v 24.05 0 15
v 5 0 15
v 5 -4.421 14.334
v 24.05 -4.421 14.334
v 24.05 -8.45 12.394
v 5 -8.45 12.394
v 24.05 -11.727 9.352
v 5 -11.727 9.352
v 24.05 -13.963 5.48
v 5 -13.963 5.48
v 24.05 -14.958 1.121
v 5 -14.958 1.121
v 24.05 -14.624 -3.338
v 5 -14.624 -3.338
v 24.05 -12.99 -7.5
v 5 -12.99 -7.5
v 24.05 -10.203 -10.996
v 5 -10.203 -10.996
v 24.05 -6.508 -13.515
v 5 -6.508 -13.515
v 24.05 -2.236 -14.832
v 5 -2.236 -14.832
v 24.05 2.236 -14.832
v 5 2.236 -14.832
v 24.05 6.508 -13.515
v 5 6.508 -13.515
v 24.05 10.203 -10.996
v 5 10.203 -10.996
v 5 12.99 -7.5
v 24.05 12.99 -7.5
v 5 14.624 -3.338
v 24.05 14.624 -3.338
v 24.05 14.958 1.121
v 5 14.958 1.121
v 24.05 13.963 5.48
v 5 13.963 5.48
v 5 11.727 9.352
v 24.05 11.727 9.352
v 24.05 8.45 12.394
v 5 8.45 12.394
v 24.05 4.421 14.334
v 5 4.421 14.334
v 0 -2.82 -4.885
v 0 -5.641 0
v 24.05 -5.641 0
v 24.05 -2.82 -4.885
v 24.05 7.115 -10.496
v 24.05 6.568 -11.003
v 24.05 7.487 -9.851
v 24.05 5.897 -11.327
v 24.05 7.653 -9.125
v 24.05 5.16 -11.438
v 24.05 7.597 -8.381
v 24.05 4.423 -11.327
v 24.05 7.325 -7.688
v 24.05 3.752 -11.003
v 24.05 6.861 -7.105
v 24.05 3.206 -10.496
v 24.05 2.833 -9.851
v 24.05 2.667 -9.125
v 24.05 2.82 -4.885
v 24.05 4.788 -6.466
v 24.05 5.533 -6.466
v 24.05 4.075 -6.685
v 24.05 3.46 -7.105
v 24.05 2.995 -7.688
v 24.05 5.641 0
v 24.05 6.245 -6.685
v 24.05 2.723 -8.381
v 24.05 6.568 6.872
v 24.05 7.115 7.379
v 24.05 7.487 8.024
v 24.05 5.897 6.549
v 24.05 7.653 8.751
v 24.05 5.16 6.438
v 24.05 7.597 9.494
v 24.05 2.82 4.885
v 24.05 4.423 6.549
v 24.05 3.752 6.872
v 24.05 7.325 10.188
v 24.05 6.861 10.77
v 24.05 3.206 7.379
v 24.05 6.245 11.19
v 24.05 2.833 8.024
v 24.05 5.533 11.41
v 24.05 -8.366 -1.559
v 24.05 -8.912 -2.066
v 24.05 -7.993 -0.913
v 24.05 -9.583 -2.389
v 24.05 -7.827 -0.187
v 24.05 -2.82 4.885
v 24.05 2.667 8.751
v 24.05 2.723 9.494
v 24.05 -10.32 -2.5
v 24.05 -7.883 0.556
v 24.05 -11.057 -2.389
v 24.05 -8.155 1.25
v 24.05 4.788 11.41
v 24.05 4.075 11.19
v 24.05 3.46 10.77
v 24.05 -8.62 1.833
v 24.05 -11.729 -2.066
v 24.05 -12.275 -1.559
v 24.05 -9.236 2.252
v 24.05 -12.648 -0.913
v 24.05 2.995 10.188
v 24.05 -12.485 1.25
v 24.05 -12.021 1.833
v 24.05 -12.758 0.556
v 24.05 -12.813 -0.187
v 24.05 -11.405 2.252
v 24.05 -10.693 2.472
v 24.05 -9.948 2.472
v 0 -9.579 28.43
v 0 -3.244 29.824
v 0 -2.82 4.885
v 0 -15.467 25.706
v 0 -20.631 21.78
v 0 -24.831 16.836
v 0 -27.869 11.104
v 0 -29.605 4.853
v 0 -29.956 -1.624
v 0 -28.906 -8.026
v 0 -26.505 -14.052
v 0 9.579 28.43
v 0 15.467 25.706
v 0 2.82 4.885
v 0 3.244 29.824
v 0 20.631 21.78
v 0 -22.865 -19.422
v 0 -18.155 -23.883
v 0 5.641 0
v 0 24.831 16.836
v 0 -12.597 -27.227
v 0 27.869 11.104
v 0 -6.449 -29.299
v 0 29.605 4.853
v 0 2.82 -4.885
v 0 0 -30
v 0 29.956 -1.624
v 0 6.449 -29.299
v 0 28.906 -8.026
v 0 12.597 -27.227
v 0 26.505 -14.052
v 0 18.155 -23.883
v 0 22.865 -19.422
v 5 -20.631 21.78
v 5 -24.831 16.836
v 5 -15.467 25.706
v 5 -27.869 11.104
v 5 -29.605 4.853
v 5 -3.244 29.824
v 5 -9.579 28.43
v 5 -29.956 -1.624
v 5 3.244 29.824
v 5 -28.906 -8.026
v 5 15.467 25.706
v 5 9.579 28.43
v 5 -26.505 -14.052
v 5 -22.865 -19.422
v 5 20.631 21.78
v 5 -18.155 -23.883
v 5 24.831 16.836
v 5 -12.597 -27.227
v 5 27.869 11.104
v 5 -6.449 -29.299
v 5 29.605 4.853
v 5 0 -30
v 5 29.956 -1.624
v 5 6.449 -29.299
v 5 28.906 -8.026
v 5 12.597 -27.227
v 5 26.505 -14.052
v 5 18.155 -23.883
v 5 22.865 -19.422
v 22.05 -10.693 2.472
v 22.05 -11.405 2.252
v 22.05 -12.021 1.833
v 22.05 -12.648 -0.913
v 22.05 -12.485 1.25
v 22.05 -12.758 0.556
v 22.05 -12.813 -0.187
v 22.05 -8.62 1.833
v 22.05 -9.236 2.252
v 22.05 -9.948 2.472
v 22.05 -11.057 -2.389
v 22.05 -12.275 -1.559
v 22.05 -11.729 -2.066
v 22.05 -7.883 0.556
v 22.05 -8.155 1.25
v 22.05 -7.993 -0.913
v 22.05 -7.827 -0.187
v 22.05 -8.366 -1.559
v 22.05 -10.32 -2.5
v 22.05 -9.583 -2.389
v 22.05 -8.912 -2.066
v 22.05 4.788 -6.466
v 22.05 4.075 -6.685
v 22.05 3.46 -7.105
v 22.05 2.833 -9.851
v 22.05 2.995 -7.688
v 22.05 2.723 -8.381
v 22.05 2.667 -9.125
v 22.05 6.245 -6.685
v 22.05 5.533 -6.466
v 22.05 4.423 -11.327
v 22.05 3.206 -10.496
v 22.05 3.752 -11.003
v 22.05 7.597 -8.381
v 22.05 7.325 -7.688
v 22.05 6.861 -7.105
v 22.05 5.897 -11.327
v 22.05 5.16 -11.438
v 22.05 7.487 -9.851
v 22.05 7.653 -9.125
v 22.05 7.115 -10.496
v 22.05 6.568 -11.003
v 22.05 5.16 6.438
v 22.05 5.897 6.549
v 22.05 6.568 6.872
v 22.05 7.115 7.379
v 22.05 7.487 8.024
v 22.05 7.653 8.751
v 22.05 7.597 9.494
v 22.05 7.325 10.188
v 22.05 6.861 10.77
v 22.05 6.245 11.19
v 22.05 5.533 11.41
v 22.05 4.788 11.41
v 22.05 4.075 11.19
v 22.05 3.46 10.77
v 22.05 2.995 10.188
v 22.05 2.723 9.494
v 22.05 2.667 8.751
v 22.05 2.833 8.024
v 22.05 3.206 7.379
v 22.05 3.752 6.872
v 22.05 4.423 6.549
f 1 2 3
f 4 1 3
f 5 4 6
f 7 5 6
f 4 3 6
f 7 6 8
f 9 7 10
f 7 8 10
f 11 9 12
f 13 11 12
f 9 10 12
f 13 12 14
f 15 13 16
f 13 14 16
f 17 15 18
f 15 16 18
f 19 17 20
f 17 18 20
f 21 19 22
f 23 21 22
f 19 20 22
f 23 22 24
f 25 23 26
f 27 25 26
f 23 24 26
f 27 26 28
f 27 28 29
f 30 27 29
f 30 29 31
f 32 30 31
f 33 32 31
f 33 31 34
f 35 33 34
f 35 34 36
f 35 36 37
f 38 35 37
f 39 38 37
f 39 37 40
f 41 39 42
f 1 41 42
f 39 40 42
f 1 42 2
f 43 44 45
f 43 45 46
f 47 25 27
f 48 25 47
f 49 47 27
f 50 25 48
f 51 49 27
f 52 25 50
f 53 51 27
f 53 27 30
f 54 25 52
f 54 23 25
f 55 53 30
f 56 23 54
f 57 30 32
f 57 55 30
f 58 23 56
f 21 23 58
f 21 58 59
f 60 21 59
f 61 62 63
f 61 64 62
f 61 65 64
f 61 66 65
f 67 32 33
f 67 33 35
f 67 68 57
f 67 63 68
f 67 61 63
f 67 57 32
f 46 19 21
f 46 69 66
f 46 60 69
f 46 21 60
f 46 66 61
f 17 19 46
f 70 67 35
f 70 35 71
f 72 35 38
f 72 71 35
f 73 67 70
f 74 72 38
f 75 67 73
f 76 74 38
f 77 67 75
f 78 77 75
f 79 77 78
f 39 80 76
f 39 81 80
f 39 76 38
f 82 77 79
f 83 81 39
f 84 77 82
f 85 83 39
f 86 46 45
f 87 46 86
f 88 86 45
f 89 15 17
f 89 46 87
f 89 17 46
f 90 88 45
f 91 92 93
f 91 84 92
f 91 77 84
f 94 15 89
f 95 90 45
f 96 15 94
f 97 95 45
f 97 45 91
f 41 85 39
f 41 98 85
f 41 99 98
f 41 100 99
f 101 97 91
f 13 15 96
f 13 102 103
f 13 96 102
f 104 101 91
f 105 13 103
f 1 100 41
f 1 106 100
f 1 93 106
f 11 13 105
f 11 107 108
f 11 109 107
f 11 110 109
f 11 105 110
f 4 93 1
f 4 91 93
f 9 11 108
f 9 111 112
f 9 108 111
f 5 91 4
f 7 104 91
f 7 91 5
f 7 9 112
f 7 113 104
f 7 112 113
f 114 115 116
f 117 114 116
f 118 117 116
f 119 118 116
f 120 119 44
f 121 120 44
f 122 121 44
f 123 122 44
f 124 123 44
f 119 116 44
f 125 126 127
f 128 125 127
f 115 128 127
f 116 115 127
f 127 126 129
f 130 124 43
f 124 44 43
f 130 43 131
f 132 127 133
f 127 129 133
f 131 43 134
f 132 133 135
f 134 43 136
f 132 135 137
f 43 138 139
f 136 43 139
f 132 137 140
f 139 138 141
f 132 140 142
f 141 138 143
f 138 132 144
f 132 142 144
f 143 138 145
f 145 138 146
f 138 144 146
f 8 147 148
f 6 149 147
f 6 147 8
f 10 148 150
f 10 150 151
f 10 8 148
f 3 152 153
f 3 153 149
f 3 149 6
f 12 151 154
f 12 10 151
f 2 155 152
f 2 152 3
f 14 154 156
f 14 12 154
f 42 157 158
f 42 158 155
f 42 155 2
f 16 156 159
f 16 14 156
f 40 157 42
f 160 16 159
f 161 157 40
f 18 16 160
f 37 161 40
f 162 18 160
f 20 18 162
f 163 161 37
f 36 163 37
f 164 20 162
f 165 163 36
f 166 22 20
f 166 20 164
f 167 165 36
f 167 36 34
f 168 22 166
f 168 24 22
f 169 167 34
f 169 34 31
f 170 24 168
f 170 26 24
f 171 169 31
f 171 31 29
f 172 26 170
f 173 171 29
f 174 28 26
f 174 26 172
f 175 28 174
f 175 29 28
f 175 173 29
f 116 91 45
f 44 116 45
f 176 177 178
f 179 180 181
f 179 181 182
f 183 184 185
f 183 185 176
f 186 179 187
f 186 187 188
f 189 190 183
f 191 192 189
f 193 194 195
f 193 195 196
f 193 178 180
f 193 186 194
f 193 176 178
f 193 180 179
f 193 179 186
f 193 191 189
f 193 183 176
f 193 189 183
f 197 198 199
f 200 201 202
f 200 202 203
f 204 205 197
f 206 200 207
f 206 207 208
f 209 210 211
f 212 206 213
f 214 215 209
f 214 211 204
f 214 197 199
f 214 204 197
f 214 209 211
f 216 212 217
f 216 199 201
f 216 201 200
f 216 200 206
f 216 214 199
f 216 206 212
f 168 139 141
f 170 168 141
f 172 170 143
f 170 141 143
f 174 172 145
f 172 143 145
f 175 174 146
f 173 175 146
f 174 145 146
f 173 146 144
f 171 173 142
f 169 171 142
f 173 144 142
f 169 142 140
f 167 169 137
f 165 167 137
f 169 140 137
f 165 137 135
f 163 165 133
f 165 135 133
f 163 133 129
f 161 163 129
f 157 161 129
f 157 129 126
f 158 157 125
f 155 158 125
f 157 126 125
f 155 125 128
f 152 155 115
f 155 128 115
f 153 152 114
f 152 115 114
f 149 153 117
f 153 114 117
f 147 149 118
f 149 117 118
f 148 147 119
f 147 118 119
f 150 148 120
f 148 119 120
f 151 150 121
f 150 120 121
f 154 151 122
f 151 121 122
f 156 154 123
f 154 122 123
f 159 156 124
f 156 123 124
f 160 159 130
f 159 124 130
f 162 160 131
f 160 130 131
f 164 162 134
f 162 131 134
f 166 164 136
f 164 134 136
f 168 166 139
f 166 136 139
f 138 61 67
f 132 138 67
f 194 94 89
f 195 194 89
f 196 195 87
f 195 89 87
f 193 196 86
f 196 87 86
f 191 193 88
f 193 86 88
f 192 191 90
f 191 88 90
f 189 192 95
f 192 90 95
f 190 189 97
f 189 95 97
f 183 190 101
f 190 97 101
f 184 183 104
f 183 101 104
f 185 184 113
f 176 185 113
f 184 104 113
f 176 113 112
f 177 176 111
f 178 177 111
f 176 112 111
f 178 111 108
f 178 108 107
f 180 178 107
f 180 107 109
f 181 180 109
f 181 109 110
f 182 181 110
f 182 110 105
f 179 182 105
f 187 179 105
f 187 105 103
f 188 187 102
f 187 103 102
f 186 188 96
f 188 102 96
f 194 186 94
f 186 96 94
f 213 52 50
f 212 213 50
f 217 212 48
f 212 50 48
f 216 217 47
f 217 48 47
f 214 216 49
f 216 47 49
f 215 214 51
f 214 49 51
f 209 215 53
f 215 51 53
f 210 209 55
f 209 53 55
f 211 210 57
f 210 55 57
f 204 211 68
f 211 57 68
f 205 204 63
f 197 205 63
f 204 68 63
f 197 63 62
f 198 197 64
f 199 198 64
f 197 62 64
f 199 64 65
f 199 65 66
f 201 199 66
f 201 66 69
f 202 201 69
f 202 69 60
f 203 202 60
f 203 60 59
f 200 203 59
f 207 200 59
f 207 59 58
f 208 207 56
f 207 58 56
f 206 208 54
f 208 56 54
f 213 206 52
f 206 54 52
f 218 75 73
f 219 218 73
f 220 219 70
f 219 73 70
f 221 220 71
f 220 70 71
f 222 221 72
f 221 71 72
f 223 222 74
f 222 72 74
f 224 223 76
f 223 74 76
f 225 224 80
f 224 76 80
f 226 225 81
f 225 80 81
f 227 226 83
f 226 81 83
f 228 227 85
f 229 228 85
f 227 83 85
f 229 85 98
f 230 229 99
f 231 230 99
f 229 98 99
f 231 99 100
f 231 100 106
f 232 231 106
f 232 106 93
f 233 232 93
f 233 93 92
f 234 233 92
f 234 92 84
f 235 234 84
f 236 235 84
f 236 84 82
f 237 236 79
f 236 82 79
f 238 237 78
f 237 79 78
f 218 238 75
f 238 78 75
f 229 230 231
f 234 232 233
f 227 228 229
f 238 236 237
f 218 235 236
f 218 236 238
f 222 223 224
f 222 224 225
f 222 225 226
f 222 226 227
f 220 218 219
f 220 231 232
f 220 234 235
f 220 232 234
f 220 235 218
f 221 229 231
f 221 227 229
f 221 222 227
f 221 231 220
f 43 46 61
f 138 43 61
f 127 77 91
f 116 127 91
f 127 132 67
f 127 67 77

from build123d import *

# Parameters (mm, degrees)
SKETCH2_R           = 30
BOSS_EXTRUDE1_DEPTH = 5
SKETCH3_R           = 15
BOSS_EXTRUDE2_DEPTH = 19.05
CUT_EXTRUDE1_DEPTH  = 24.05
SKETCH5_R           = 2.5
CUT_EXTRUDE2_DEPTH  = 2


with BuildPart() as part:
    # Sketch2 → Boss-Extrude1 (new body)
    with BuildSketch(Plane(origin=(0, 0, 0), x_dir=(0, 0, -1), z_dir=(1, 0, 0))):
        Circle(SKETCH2_R)
    extrude(amount=BOSS_EXTRUDE1_DEPTH)

    # Sketch3 → Boss-Extrude2 (add)
    with BuildSketch(Plane(origin=(5, 0, 0), x_dir=(0, 0, -1), z_dir=(1, 0, 0))):
        with Locations(Location((0, 0, 0), (0, 0, 180))):
            Circle(SKETCH3_R)
    extrude(amount=BOSS_EXTRUDE2_DEPTH)

    # Sketch4 → Cut-Extrude1 (cut)
    with BuildSketch(Plane(origin=(24.05, 0, 0), x_dir=(0, 0, -1), z_dir=(1, 0, 0))):
        Polygon((0, 5.64071213), (-4.885, 2.820356065), (-4.885, -2.820356065), (0, -5.64071213), (4.885, -2.820356065), (4.885, 2.820356065), align=None)
    extrude(amount=-CUT_EXTRUDE1_DEPTH, mode=Mode.SUBTRACT)

    # Sketch5 → Cut-Extrude2 (cut)
    with BuildSketch(Plane(origin=(24.05, 0, 0), x_dir=(0, 0, -1), z_dir=(1, 0, 0))):
        with Locations((8.937690528, 5.160178032)):
            Circle(SKETCH5_R)
        with Locations((-8.937690528, 5.160178032)):
            Circle(SKETCH5_R)
        with Locations((0, -10.320356065)):
            Circle(SKETCH5_R)
    extrude(amount=-CUT_EXTRUDE2_DEPTH, mode=Mode.SUBTRACT)


solid = part.part
